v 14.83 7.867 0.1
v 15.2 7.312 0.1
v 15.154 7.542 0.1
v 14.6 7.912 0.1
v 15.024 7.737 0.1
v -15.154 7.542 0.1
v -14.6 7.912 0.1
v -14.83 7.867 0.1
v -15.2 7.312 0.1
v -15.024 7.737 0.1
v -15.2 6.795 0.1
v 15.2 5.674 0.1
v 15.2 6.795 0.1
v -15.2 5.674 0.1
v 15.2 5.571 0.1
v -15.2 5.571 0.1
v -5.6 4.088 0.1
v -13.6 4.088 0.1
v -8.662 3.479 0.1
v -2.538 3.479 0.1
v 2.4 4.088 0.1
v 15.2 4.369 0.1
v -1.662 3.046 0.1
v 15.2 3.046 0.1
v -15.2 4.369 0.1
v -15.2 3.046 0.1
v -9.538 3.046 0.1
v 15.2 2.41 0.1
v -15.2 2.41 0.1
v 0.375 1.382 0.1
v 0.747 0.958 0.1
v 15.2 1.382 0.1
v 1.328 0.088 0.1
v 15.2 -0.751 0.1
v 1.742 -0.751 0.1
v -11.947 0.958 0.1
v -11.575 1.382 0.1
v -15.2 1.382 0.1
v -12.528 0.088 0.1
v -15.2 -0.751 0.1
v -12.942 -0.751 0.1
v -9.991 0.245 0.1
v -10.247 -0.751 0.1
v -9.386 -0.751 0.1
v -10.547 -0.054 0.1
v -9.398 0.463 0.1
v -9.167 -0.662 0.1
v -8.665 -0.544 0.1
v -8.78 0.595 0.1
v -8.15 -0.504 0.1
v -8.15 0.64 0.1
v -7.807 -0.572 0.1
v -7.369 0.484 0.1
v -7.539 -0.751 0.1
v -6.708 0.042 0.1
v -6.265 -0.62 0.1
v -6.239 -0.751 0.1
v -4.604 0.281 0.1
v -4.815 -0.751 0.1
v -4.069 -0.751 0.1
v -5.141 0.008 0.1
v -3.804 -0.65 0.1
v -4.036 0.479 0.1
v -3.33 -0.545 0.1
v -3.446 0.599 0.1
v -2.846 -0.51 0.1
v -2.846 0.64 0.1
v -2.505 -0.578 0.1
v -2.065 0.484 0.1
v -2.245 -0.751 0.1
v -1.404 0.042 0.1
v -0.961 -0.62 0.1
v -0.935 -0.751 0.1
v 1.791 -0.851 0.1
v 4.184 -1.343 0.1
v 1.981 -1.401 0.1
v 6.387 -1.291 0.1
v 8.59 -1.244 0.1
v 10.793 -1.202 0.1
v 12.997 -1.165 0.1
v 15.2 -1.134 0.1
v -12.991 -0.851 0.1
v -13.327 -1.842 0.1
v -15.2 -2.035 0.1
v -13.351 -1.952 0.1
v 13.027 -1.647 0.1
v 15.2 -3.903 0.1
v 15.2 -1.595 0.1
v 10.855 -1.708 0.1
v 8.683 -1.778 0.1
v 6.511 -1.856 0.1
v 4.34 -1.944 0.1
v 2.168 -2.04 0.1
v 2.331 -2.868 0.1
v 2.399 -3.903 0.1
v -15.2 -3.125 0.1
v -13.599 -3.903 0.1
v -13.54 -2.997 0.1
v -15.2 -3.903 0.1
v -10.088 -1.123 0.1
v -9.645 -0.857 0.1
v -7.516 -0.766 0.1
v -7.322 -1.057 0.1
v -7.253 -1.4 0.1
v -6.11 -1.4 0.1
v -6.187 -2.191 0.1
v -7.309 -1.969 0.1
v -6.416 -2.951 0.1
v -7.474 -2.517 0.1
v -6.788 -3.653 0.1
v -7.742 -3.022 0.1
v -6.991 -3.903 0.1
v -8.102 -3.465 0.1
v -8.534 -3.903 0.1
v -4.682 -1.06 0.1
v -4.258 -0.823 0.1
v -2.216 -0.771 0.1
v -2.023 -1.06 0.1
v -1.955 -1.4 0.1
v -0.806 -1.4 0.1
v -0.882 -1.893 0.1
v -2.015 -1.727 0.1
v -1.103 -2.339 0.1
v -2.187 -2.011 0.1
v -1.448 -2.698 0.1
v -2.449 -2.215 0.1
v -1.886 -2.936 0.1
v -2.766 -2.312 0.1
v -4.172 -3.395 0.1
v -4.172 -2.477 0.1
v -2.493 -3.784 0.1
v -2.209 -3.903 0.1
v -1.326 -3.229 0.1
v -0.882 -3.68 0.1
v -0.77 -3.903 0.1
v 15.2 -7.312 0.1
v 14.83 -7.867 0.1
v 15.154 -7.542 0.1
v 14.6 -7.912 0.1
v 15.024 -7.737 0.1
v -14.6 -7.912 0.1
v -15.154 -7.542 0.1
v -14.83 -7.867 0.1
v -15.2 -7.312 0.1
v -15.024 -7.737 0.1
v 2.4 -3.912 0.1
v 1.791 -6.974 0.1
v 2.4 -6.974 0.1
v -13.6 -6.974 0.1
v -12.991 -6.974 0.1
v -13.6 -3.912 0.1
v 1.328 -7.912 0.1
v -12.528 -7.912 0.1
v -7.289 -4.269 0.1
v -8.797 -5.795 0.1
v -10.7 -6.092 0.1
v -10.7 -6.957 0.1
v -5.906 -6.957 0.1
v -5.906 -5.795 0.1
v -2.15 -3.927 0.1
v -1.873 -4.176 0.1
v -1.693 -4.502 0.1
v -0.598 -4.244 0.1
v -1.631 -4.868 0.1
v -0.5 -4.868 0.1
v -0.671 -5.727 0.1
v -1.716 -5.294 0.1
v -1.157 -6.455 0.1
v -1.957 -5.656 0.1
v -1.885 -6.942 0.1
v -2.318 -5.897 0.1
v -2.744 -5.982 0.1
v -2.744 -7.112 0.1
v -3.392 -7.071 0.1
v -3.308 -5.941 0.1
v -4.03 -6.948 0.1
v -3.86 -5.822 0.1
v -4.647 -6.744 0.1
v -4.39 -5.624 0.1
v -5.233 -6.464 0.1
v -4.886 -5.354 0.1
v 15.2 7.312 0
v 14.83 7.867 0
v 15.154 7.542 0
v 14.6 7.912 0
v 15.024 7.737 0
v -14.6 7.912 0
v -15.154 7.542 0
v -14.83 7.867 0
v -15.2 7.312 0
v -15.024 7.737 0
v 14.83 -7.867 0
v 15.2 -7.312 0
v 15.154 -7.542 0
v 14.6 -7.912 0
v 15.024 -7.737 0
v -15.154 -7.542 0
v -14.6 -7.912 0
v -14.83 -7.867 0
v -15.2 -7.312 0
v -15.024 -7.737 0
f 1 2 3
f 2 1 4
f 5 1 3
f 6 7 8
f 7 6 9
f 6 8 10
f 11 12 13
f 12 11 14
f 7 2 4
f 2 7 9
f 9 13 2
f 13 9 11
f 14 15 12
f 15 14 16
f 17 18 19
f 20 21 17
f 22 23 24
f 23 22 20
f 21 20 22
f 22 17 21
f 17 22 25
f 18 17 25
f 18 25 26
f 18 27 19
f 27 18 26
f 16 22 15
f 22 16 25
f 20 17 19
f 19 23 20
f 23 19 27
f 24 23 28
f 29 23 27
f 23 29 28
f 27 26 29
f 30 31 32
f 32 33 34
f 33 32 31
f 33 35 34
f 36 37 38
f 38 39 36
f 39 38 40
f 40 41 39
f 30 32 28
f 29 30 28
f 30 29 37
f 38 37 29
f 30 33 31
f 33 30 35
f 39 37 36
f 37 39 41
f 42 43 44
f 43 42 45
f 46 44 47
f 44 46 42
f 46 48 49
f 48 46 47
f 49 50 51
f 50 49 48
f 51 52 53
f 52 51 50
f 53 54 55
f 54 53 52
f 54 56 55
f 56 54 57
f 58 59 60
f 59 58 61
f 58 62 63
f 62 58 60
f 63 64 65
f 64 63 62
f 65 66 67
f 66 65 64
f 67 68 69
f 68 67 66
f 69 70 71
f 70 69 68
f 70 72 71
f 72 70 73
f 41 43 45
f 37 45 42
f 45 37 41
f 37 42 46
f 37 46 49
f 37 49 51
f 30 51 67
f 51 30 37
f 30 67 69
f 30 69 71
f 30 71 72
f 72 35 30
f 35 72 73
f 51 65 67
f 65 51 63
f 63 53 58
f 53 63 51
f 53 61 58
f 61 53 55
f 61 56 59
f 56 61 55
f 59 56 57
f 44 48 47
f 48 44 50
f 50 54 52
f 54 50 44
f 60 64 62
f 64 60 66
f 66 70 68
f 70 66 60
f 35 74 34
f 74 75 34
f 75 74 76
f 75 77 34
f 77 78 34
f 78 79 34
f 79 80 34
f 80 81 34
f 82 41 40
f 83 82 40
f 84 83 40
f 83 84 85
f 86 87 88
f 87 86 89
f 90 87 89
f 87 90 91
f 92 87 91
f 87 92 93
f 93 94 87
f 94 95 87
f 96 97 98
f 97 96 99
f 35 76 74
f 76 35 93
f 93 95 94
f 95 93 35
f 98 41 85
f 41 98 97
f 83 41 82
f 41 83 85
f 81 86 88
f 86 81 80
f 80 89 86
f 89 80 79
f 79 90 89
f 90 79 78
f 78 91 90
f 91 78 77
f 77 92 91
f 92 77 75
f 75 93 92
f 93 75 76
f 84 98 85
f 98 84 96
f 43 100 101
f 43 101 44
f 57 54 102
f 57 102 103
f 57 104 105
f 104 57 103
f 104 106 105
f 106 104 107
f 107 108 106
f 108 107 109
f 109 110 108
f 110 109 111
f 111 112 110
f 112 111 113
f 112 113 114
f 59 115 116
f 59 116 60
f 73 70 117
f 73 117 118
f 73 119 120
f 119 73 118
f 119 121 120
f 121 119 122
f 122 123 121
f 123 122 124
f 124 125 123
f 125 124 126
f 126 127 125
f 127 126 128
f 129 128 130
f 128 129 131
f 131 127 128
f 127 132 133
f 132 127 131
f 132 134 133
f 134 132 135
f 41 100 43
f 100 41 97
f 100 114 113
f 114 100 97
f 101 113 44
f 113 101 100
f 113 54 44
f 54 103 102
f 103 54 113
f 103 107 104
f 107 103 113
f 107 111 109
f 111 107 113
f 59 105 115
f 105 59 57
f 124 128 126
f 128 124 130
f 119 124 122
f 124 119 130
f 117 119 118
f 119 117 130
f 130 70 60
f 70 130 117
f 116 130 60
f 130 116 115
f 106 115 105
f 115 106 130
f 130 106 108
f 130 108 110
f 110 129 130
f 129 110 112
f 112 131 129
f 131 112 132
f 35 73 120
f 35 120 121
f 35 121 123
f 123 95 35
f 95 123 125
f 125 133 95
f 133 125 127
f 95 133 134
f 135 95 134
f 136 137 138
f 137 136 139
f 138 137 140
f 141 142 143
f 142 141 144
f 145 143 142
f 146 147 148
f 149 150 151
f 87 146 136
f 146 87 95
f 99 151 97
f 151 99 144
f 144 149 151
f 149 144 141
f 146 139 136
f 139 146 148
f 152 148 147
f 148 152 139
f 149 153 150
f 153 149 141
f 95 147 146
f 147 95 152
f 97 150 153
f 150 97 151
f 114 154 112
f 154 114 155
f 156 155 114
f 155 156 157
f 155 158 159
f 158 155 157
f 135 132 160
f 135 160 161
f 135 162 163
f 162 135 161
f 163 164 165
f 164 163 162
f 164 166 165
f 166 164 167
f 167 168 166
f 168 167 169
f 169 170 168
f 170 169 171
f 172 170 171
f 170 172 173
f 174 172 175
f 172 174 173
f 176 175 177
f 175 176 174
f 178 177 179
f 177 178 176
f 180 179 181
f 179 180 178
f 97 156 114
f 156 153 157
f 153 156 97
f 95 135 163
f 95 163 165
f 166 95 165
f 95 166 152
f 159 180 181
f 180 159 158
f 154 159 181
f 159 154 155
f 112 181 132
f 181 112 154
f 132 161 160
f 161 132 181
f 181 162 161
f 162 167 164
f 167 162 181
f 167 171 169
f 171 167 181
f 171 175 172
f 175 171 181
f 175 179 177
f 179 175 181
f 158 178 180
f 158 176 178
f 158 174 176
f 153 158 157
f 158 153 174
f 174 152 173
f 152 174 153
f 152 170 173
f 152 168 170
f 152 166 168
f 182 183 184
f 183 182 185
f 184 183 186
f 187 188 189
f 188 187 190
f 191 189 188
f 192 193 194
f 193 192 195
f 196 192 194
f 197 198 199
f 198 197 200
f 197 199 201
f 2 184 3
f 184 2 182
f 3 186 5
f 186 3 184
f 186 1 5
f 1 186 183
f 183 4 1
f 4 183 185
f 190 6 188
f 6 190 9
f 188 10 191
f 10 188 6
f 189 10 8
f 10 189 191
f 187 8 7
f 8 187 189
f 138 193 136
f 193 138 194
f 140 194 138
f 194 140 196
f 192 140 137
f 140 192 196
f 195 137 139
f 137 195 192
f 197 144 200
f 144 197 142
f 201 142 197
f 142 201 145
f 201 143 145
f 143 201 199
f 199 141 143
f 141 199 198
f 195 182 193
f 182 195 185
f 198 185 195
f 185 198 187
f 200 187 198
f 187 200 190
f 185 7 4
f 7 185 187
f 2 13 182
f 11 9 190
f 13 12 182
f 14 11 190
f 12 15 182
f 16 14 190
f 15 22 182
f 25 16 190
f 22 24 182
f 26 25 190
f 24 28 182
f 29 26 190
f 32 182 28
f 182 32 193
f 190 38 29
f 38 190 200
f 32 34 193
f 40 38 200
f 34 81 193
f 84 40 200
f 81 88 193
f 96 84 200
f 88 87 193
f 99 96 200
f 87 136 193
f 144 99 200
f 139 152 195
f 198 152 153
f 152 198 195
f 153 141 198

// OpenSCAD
use <../lib.scad>
use <s/6148328ws01.scad>
use <s/6148328ws02.scad>
use <s/6148328ws06.scad>
use <s/6148328xs01.scad>
use <s/6148328xs02.scad>
use <s/6148328xs03.scad>
function ldraw_lib__6148328x() = [
// 0 Sticker  2.0 x  3.8 with White Stripes and Black "23" in White Circle on Red Background Left
// 0 Name: 6148328x.dat
// 0 Author: Massimo Maso [Sirio]
// 0 !LDRAW_ORG Part UPDATE 2024-05
// 0 !LICENSE Licensed under CC BY 4.0 : see CAreadme.txt
// 
// 0 BFC CERTIFY CCW
  [0,"BFC","CERTIFY"],
  [0,"BFC","CCW"],
// 
// 0 !KEYWORDS 917K, Bricklink 75876stk01, Brickowl 852010, Pit Lane, Porsche
// 0 !KEYWORDS Rebrickable 26357, set 75876, Speed Champions
// 
// 0 !HISTORY 2024-06-30 [OrionP] Official Update 2024-05
// 
// 
// 0 // Subparts
// 
// 1 16 0 0 13.9773 -1 0 0 0 1 0 0 0 1 s\6148328ws01.dat
  [1,16,0,0,13.9773,-1,0,0,0,1,0,0,0,1, ldraw_lib__s__6148328ws01()],
// 1 16 0 0 13.8779 -1 0 0 0 1 0 0 0 1 s\6148328ws02.dat
  [1,16,0,0,13.8779,-1,0,0,0,1,0,0,0,1, ldraw_lib__s__6148328ws02()],
// 1 16 0 0 -1.8287 1 0 0 0 1 0 0 0 1 s\6148328xs01.dat
  [1,16,0,0,-1.8287,1,0,0,0,1,0,0,0,1, ldraw_lib__s__6148328xs01()],
// 1 16 0 0 -1.9281 1 0 0 0 1 0 0 0 1 s\6148328xs02.dat
  [1,16,0,0,-1.9281,1,0,0,0,1,0,0,0,1, ldraw_lib__s__6148328xs02()],
// 1 16 0 0 -9.7812 1 0 0 0 1 0 0 0 1 s\6148328xs03.dat
  [1,16,0,0,-9.7812,1,0,0,0,1,0,0,0,1, ldraw_lib__s__6148328xs03()],
// 1 16 0 0 0 -1 0 0 0 1 0 0 0 1 s\6148328ws06.dat
  [1,16,0,0,0,-1,0,0,0,1,0,0,0,1, ldraw_lib__s__6148328ws06()],
];
module ldraw_lib__6148328x(step=0, col=false, unit=2/5, alt=false, line=0.2, solid=!$preview)
    makepoly(ldraw_lib__6148328x(), step=step, col=col, unit=unit, alt=alt, line=line, solid=solid);
ldraw_lib__6148328x(line=0.2);
